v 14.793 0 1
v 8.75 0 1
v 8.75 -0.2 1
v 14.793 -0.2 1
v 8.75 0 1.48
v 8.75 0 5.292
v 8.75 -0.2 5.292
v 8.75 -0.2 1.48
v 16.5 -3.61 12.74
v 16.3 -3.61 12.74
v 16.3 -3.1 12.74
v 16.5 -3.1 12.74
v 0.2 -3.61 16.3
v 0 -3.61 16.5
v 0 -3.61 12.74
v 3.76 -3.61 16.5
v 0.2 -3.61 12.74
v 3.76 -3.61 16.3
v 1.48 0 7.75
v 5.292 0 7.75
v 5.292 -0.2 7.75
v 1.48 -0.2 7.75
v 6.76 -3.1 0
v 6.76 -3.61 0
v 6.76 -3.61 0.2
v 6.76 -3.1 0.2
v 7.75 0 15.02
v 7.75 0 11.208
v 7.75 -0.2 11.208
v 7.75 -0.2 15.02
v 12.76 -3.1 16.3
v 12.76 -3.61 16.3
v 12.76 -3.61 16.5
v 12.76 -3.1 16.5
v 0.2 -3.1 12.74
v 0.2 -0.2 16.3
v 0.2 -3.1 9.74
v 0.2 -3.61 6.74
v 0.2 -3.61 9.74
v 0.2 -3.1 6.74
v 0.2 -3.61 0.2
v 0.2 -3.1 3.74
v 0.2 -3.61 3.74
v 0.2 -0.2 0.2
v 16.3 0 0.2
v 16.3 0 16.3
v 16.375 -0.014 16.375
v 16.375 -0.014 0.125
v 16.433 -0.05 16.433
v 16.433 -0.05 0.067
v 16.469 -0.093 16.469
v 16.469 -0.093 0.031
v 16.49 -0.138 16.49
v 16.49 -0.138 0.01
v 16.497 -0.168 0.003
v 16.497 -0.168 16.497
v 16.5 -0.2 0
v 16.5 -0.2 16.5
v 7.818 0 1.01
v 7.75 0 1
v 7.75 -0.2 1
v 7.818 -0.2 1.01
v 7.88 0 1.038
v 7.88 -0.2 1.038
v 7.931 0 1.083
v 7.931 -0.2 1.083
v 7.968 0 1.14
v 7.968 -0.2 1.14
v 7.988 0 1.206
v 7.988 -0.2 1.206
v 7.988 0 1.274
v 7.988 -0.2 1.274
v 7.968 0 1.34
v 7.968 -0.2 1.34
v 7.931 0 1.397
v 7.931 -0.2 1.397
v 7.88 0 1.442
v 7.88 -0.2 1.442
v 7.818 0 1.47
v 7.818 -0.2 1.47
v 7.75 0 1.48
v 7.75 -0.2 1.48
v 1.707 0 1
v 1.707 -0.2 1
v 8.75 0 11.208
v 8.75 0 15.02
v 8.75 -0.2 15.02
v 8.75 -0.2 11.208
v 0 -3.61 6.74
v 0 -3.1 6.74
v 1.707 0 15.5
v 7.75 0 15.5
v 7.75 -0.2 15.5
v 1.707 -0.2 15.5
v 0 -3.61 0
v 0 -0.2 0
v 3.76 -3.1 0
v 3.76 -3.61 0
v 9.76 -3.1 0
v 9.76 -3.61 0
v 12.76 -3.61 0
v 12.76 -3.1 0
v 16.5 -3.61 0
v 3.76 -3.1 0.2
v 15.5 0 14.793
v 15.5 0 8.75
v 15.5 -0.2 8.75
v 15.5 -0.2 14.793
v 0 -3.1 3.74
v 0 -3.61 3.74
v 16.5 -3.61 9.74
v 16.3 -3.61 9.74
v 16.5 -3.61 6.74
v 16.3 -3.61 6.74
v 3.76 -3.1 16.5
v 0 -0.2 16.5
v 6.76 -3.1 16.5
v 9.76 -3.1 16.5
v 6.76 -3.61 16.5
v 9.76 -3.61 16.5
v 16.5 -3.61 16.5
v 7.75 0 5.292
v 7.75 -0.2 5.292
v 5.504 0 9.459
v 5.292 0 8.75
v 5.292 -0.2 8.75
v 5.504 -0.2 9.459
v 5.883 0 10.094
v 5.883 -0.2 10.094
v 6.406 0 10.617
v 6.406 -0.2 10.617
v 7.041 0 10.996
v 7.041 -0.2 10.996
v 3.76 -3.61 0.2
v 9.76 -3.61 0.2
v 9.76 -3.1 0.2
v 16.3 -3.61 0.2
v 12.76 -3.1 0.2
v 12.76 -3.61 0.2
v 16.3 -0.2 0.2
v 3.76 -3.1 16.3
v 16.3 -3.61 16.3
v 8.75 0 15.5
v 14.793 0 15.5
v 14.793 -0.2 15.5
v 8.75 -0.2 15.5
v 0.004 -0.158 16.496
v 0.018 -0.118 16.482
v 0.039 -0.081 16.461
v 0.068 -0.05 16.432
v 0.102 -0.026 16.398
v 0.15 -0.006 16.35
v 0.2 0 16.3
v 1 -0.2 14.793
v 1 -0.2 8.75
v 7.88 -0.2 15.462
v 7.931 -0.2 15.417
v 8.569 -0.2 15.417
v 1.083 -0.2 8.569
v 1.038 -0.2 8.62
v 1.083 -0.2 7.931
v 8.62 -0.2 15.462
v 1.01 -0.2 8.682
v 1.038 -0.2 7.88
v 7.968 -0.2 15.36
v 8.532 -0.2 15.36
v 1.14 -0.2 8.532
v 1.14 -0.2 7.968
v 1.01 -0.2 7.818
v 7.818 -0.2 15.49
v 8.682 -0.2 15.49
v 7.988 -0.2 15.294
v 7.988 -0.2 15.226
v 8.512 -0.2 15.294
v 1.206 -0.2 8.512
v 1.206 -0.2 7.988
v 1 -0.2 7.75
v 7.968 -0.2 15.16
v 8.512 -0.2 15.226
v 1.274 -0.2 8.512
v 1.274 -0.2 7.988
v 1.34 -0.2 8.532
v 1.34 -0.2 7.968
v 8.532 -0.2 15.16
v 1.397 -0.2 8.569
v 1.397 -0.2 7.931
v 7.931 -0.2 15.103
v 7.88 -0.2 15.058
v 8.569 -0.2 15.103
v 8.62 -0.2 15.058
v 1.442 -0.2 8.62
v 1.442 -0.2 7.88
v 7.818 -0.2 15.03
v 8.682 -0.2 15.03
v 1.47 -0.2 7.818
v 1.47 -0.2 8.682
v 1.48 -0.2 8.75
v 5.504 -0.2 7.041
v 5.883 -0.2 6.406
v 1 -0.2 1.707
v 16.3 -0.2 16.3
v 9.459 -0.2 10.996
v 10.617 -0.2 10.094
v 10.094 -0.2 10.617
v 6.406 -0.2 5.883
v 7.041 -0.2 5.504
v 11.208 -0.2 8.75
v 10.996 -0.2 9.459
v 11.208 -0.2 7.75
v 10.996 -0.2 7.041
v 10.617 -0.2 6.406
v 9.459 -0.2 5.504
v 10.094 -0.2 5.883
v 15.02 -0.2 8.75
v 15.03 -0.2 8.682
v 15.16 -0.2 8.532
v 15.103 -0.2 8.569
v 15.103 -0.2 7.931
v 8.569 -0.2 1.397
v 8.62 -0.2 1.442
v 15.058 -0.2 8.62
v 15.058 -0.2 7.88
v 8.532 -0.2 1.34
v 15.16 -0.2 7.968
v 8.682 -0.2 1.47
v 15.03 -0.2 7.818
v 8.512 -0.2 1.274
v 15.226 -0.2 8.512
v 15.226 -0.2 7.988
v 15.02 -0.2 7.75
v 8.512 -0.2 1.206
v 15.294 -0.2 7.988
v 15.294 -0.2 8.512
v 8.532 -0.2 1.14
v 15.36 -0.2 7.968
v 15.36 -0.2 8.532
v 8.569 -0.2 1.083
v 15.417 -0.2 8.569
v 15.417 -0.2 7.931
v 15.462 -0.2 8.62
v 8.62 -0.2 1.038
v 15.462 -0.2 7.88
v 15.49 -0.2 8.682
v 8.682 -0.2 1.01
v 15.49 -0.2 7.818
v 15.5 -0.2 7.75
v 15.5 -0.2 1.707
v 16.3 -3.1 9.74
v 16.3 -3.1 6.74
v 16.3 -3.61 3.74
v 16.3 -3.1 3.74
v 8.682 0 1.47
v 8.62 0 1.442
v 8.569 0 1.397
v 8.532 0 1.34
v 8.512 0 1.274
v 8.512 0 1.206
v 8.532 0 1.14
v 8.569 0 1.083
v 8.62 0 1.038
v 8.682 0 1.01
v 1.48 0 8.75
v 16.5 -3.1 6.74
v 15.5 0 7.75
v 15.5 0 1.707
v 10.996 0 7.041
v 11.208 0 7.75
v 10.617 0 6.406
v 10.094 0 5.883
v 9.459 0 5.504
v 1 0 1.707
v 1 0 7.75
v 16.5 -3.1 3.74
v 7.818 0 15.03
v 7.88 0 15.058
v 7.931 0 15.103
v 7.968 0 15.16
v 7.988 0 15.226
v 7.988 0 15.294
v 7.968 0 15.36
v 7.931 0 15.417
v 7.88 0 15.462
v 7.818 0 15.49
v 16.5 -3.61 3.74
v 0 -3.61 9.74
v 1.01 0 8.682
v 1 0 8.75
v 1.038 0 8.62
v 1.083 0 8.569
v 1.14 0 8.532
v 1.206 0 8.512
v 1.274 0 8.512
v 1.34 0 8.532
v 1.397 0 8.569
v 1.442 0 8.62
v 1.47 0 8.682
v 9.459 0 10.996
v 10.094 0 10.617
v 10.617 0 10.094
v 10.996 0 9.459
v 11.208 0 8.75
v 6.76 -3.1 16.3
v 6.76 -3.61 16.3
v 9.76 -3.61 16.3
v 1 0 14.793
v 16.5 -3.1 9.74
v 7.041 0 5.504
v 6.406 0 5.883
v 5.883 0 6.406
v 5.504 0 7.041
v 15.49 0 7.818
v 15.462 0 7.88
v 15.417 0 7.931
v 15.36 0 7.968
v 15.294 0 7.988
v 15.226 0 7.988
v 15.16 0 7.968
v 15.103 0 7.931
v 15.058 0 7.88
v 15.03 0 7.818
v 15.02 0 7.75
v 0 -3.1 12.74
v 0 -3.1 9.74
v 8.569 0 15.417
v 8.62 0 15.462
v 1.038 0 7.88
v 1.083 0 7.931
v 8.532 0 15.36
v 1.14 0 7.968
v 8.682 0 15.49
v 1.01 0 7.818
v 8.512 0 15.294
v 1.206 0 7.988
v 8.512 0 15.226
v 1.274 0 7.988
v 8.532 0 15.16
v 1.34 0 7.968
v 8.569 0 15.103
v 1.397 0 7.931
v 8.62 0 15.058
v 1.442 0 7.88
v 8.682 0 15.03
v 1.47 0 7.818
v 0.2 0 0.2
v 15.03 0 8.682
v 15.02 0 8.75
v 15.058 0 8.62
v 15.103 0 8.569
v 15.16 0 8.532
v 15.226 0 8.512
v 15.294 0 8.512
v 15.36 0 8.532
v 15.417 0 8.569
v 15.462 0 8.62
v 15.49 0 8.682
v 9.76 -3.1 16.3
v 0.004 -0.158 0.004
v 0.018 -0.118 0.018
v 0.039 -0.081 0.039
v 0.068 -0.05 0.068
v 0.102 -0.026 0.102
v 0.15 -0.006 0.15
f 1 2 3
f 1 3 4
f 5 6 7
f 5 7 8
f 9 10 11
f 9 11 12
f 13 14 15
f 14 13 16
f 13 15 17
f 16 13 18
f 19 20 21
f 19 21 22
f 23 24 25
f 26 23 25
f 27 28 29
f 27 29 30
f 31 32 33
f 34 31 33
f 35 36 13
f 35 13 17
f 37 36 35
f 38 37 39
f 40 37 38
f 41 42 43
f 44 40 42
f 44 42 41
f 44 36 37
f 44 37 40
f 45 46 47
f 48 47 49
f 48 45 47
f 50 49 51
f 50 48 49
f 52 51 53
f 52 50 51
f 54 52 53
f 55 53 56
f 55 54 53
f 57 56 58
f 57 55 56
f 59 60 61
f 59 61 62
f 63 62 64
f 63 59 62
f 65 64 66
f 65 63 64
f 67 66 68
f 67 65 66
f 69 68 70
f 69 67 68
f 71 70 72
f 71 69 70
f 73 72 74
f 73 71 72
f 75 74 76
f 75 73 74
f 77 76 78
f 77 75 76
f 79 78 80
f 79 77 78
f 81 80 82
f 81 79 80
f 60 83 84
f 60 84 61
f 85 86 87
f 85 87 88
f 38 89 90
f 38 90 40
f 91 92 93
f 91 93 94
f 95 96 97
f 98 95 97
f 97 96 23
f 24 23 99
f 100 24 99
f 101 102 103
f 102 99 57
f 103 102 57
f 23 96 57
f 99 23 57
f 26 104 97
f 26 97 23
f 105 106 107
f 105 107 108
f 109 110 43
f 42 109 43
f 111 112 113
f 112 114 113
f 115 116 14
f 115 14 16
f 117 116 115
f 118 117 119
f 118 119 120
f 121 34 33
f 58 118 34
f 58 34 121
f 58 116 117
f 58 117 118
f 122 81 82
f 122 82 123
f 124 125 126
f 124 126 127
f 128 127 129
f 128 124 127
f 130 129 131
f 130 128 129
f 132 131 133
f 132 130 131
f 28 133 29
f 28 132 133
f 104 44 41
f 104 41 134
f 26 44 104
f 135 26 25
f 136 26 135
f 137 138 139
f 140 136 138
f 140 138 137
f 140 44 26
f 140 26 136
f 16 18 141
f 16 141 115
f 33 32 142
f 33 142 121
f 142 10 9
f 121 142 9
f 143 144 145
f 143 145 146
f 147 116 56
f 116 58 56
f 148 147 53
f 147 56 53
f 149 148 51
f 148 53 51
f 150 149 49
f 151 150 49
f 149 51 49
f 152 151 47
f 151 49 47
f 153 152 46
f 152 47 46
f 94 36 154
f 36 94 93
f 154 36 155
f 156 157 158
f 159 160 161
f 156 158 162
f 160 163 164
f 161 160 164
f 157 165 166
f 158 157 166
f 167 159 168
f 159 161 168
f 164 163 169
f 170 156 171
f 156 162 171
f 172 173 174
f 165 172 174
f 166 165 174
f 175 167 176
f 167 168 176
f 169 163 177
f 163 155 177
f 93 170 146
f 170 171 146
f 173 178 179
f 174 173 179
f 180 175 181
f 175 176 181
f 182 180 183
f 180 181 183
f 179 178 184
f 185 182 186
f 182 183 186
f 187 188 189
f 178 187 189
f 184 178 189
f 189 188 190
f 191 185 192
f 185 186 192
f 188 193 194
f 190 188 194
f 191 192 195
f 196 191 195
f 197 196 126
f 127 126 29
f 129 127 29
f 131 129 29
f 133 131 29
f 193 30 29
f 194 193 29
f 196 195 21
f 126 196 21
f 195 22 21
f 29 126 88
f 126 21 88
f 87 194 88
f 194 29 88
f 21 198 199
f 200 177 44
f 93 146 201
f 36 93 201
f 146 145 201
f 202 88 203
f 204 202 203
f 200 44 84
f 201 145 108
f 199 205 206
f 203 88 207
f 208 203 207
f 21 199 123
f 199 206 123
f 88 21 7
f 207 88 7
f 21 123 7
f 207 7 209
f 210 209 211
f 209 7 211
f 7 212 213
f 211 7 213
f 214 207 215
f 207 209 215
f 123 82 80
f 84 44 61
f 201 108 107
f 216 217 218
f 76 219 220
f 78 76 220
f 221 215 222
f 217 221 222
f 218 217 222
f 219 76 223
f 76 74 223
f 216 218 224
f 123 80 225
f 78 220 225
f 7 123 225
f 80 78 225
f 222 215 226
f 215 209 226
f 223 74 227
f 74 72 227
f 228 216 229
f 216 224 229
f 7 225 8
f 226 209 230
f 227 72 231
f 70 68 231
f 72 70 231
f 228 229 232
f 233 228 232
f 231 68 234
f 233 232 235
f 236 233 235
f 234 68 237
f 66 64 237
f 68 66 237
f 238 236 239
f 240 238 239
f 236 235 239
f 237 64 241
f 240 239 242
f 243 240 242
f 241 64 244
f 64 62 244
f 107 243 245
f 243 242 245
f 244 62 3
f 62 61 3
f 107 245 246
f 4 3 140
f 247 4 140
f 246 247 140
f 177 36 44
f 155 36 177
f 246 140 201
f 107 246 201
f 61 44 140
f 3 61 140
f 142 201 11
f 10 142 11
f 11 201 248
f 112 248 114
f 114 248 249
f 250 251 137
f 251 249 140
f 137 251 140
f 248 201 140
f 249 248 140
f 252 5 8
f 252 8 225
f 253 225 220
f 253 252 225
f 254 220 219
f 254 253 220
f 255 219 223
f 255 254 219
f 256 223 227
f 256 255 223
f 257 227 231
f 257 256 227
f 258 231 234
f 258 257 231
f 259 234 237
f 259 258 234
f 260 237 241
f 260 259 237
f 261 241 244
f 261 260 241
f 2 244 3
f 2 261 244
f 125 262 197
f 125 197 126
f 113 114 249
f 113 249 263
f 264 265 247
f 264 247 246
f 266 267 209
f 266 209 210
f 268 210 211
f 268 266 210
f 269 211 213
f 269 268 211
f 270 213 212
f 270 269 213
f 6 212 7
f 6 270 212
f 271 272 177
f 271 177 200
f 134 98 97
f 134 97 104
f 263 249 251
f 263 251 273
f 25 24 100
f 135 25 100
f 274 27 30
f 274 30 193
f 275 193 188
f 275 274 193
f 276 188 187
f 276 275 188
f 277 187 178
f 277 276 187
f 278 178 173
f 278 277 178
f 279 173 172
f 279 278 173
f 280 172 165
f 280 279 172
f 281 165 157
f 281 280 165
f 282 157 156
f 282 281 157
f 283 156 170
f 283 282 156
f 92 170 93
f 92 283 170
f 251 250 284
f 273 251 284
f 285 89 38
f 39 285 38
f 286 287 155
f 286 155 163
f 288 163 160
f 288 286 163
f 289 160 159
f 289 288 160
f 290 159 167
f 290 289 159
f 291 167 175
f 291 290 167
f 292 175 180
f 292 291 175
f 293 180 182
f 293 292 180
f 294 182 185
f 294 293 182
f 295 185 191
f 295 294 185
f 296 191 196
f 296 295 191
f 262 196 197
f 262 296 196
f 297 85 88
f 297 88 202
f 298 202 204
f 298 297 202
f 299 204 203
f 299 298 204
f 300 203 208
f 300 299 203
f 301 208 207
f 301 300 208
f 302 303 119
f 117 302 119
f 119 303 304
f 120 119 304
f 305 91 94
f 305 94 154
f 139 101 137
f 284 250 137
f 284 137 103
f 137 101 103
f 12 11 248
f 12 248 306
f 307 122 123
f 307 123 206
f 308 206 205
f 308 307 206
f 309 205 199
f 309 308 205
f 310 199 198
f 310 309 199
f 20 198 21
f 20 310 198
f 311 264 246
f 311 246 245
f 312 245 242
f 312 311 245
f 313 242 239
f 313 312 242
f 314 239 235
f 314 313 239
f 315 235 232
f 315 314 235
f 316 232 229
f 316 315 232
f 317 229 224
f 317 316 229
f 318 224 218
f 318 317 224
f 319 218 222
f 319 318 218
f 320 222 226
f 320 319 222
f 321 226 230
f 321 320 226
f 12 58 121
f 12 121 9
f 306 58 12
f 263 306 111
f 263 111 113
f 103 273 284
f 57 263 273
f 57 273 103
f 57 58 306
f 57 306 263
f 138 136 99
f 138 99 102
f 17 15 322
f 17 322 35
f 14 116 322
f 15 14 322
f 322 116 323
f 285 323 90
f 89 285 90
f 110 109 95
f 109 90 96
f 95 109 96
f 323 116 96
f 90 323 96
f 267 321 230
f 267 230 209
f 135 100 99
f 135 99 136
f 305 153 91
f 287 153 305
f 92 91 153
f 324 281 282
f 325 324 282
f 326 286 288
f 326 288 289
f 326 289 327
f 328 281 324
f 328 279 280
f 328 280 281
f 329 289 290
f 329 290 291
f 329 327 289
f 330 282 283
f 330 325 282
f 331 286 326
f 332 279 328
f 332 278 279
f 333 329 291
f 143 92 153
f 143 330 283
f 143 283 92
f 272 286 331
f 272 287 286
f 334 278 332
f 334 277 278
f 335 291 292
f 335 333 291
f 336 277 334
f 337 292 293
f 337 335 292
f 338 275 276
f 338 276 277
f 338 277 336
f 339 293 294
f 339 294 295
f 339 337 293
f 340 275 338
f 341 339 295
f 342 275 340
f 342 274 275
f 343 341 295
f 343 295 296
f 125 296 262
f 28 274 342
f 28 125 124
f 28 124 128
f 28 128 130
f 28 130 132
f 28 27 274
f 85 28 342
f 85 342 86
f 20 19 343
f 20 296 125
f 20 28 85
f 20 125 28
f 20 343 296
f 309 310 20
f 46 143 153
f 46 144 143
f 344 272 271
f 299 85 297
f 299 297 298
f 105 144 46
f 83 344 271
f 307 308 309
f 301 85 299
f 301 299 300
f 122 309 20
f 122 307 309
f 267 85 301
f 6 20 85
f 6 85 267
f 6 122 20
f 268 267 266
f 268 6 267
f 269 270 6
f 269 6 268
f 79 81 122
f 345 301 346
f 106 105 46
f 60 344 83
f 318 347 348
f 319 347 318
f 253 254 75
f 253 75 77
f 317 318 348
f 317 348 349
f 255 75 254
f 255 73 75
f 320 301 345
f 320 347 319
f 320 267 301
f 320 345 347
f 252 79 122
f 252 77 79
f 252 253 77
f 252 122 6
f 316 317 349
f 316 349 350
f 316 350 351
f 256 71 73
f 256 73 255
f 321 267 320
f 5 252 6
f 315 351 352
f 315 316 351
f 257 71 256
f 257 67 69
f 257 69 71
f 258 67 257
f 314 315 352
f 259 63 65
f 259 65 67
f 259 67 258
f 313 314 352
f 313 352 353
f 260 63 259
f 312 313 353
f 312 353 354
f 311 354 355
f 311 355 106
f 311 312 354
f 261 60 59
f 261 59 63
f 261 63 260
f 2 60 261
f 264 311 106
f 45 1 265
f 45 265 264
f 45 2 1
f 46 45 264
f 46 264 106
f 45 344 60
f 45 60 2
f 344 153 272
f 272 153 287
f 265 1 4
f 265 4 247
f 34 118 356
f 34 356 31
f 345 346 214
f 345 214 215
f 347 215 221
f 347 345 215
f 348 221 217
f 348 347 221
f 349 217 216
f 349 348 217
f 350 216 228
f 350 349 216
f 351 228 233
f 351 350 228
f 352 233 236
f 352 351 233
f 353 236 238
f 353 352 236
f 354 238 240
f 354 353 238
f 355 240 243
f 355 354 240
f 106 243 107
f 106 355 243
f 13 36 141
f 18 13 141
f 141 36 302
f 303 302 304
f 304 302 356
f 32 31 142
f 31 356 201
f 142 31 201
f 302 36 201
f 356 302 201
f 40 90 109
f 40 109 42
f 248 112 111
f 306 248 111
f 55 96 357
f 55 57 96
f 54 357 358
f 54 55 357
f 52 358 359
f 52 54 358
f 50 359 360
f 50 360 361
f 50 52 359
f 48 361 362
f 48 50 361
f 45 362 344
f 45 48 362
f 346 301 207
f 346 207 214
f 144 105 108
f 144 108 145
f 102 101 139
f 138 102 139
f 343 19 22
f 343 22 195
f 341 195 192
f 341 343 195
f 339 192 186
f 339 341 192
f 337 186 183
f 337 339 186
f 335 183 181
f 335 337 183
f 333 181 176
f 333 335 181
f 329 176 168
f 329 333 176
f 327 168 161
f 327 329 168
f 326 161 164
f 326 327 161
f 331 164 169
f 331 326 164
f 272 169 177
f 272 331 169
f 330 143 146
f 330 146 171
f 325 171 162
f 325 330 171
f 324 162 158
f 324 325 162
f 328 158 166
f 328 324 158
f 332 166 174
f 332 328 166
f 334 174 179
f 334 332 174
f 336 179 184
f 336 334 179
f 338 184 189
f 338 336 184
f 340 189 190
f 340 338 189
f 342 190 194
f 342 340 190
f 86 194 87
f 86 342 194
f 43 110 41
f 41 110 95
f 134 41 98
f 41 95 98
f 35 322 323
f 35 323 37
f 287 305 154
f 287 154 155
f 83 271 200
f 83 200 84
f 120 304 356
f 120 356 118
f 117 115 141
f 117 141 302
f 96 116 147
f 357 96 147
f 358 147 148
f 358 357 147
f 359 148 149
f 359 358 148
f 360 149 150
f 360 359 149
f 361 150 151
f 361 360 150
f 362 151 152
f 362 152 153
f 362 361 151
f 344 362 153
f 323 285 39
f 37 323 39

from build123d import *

# Parameters (mm, degrees)
SKETCH_1_W          = 16.1
SKETCH_1_H          = 16.1
EXTRUDE_1_DEPTH     = 0.2
SKETCH_2_W          = 16.5
SKETCH_2_H          = 16.5
SKETCH_2_W_2        = 16.1
SKETCH_2_H_2        = 16.1
EXTRUDE_2_DEPTH     = 3.61
FILLET_1_R          = 0.2
SKETCH_3_W          = 0.2
SKETCH_3_H          = 3
SKETCH_3_W_2        = 3
SKETCH_3_H_2        = 0.2
CUT_EXTRUDE_1_DEPTH = 0.51


with BuildPart() as part:
    # 草图1 → 凸台-拉伸1 (new body)
    with BuildSketch(Plane(origin=(0, 0, 0), x_dir=(1, 0, 0), z_dir=(0, 1, 0))):
        with Locations((8.25, -8.25)):
            Rectangle(SKETCH_1_W, SKETCH_1_H)
        with BuildLine():
            Line((1.706516818, -15.5), (1, -14.793483182))
            Line((1, -14.793483182), (1, -8.75))
            ThreePointArc((1, -8.75), (1.24, -8.51), (1.48, -8.75))
            Line((1.48, -8.75), (5.291960108, -8.75))
            ThreePointArc((5.291960108, -8.75), (6.128679656, -10.371320344), (7.75, -11.208039892))
            Line((7.75, -11.208039892), (7.75, -15.02))
            ThreePointArc((7.75, -15.02), (7.99, -15.26), (7.75, -15.5))
            Line((7.75, -15.5), (1.706516818, -15.5))
        make_face(mode=Mode.SUBTRACT)
        with BuildLine():
            Line((5.291960108, -7.75), (1.48, -7.75))
            ThreePointArc((1.48, -7.75), (1.24, -7.99), (1, -7.75))
            Line((1, -7.75), (1, -1.706516818))
            Line((1, -1.706516818), (1.706516818, -1))
            Line((1.706516818, -1), (7.75, -1))
            ThreePointArc((7.75, -1), (7.99, -1.24), (7.75, -1.48))
            Line((7.75, -1.48), (7.75, -5.291960108))
            ThreePointArc((7.75, -5.291960108), (6.128679656, -6.128679656), (5.291960108, -7.75))
        make_face(mode=Mode.SUBTRACT)
        with BuildLine():
            Line((8.75, -1), (14.793483182, -1))
            Line((14.793483182, -1), (15.5, -1.706516818))
            Line((15.5, -1.706516818), (15.5, -7.75))
            ThreePointArc((15.5, -7.75), (15.26, -7.99), (15.02, -7.75))
            Line((15.02, -7.75), (11.208039892, -7.75))
            ThreePointArc((11.208039892, -7.75), (10.371320344, -6.128679656), (8.75, -5.291960108))
            Line((8.75, -5.291960108), (8.75, -1.48))
            ThreePointArc((8.75, -1.48), (8.51, -1.24), (8.75, -1))
        make_face(mode=Mode.SUBTRACT)
        with BuildLine():
            Line((15.5, -8.75), (15.5, -14.793483182))
            Line((15.5, -14.793483182), (14.793483182, -15.5))
            Line((14.793483182, -15.5), (8.75, -15.5))
            ThreePointArc((8.75, -15.5), (8.51, -15.26), (8.75, -15.02))
            Line((8.75, -15.02), (8.75, -11.208039892))
            ThreePointArc((8.75, -11.208039892), (10.371320344, -10.371320344), (11.208039892, -8.75))
            Line((11.208039892, -8.75), (15.02, -8.75))
            ThreePointArc((15.02, -8.75), (15.26, -8.51), (15.5, -8.75))
        make_face(mode=Mode.SUBTRACT)
    extrude(amount=-EXTRUDE_1_DEPTH)

    # 草图2 → 凸台-拉伸2 (add)
    with BuildSketch(Plane(origin=(0, 0, 0), x_dir=(1, 0, 0), z_dir=(0, 1, 0))):
        with Locations((8.25, -8.25)):
            Rectangle(SKETCH_2_W, SKETCH_2_H)
        with Locations((8.25, -8.25)):
            Rectangle(SKETCH_2_W_2, SKETCH_2_H_2, mode=Mode.SUBTRACT)
    extrude(amount=-EXTRUDE_2_DEPTH)

    # 圆角1
    fillet_1_edges = [part.edges().sort_by_distance(p)[0] for p in [
        (16.5, 0, 8.25),
        (8.25, 0, 0),
        (0, 0, 8.25),
        (8.25, 0, 16.5),
    ]]
    fillet(fillet_1_edges, radius=FILLET_1_R)

    # 草图3 → 切除-拉伸1 (cut)
    with BuildSketch(Plane.XZ.offset(3.61)):
        with Locations((0.1, 11.24)):
            Rectangle(SKETCH_3_W, SKETCH_3_H)
        with Locations((0.1, 5.24)):
            Rectangle(SKETCH_3_W, SKETCH_3_H)
        with Locations((16.4, 11.24)):
            Rectangle(SKETCH_3_W, SKETCH_3_H)
        with Locations((16.4, 5.24)):
            Rectangle(SKETCH_3_W, SKETCH_3_H)
        with Locations((5.26, 16.4)):
            Rectangle(SKETCH_3_W_2, SKETCH_3_H_2)
        with Locations((11.26, 16.4)):
            Rectangle(SKETCH_3_W_2, SKETCH_3_H_2)
        with Locations((11.26, 0.1)):
            Rectangle(SKETCH_3_W_2, SKETCH_3_H_2)
        with Locations((5.26, 0.1)):
            Rectangle(SKETCH_3_W_2, SKETCH_3_H_2)
    extrude(amount=-CUT_EXTRUDE_1_DEPTH, mode=Mode.SUBTRACT)


solid = part.part
